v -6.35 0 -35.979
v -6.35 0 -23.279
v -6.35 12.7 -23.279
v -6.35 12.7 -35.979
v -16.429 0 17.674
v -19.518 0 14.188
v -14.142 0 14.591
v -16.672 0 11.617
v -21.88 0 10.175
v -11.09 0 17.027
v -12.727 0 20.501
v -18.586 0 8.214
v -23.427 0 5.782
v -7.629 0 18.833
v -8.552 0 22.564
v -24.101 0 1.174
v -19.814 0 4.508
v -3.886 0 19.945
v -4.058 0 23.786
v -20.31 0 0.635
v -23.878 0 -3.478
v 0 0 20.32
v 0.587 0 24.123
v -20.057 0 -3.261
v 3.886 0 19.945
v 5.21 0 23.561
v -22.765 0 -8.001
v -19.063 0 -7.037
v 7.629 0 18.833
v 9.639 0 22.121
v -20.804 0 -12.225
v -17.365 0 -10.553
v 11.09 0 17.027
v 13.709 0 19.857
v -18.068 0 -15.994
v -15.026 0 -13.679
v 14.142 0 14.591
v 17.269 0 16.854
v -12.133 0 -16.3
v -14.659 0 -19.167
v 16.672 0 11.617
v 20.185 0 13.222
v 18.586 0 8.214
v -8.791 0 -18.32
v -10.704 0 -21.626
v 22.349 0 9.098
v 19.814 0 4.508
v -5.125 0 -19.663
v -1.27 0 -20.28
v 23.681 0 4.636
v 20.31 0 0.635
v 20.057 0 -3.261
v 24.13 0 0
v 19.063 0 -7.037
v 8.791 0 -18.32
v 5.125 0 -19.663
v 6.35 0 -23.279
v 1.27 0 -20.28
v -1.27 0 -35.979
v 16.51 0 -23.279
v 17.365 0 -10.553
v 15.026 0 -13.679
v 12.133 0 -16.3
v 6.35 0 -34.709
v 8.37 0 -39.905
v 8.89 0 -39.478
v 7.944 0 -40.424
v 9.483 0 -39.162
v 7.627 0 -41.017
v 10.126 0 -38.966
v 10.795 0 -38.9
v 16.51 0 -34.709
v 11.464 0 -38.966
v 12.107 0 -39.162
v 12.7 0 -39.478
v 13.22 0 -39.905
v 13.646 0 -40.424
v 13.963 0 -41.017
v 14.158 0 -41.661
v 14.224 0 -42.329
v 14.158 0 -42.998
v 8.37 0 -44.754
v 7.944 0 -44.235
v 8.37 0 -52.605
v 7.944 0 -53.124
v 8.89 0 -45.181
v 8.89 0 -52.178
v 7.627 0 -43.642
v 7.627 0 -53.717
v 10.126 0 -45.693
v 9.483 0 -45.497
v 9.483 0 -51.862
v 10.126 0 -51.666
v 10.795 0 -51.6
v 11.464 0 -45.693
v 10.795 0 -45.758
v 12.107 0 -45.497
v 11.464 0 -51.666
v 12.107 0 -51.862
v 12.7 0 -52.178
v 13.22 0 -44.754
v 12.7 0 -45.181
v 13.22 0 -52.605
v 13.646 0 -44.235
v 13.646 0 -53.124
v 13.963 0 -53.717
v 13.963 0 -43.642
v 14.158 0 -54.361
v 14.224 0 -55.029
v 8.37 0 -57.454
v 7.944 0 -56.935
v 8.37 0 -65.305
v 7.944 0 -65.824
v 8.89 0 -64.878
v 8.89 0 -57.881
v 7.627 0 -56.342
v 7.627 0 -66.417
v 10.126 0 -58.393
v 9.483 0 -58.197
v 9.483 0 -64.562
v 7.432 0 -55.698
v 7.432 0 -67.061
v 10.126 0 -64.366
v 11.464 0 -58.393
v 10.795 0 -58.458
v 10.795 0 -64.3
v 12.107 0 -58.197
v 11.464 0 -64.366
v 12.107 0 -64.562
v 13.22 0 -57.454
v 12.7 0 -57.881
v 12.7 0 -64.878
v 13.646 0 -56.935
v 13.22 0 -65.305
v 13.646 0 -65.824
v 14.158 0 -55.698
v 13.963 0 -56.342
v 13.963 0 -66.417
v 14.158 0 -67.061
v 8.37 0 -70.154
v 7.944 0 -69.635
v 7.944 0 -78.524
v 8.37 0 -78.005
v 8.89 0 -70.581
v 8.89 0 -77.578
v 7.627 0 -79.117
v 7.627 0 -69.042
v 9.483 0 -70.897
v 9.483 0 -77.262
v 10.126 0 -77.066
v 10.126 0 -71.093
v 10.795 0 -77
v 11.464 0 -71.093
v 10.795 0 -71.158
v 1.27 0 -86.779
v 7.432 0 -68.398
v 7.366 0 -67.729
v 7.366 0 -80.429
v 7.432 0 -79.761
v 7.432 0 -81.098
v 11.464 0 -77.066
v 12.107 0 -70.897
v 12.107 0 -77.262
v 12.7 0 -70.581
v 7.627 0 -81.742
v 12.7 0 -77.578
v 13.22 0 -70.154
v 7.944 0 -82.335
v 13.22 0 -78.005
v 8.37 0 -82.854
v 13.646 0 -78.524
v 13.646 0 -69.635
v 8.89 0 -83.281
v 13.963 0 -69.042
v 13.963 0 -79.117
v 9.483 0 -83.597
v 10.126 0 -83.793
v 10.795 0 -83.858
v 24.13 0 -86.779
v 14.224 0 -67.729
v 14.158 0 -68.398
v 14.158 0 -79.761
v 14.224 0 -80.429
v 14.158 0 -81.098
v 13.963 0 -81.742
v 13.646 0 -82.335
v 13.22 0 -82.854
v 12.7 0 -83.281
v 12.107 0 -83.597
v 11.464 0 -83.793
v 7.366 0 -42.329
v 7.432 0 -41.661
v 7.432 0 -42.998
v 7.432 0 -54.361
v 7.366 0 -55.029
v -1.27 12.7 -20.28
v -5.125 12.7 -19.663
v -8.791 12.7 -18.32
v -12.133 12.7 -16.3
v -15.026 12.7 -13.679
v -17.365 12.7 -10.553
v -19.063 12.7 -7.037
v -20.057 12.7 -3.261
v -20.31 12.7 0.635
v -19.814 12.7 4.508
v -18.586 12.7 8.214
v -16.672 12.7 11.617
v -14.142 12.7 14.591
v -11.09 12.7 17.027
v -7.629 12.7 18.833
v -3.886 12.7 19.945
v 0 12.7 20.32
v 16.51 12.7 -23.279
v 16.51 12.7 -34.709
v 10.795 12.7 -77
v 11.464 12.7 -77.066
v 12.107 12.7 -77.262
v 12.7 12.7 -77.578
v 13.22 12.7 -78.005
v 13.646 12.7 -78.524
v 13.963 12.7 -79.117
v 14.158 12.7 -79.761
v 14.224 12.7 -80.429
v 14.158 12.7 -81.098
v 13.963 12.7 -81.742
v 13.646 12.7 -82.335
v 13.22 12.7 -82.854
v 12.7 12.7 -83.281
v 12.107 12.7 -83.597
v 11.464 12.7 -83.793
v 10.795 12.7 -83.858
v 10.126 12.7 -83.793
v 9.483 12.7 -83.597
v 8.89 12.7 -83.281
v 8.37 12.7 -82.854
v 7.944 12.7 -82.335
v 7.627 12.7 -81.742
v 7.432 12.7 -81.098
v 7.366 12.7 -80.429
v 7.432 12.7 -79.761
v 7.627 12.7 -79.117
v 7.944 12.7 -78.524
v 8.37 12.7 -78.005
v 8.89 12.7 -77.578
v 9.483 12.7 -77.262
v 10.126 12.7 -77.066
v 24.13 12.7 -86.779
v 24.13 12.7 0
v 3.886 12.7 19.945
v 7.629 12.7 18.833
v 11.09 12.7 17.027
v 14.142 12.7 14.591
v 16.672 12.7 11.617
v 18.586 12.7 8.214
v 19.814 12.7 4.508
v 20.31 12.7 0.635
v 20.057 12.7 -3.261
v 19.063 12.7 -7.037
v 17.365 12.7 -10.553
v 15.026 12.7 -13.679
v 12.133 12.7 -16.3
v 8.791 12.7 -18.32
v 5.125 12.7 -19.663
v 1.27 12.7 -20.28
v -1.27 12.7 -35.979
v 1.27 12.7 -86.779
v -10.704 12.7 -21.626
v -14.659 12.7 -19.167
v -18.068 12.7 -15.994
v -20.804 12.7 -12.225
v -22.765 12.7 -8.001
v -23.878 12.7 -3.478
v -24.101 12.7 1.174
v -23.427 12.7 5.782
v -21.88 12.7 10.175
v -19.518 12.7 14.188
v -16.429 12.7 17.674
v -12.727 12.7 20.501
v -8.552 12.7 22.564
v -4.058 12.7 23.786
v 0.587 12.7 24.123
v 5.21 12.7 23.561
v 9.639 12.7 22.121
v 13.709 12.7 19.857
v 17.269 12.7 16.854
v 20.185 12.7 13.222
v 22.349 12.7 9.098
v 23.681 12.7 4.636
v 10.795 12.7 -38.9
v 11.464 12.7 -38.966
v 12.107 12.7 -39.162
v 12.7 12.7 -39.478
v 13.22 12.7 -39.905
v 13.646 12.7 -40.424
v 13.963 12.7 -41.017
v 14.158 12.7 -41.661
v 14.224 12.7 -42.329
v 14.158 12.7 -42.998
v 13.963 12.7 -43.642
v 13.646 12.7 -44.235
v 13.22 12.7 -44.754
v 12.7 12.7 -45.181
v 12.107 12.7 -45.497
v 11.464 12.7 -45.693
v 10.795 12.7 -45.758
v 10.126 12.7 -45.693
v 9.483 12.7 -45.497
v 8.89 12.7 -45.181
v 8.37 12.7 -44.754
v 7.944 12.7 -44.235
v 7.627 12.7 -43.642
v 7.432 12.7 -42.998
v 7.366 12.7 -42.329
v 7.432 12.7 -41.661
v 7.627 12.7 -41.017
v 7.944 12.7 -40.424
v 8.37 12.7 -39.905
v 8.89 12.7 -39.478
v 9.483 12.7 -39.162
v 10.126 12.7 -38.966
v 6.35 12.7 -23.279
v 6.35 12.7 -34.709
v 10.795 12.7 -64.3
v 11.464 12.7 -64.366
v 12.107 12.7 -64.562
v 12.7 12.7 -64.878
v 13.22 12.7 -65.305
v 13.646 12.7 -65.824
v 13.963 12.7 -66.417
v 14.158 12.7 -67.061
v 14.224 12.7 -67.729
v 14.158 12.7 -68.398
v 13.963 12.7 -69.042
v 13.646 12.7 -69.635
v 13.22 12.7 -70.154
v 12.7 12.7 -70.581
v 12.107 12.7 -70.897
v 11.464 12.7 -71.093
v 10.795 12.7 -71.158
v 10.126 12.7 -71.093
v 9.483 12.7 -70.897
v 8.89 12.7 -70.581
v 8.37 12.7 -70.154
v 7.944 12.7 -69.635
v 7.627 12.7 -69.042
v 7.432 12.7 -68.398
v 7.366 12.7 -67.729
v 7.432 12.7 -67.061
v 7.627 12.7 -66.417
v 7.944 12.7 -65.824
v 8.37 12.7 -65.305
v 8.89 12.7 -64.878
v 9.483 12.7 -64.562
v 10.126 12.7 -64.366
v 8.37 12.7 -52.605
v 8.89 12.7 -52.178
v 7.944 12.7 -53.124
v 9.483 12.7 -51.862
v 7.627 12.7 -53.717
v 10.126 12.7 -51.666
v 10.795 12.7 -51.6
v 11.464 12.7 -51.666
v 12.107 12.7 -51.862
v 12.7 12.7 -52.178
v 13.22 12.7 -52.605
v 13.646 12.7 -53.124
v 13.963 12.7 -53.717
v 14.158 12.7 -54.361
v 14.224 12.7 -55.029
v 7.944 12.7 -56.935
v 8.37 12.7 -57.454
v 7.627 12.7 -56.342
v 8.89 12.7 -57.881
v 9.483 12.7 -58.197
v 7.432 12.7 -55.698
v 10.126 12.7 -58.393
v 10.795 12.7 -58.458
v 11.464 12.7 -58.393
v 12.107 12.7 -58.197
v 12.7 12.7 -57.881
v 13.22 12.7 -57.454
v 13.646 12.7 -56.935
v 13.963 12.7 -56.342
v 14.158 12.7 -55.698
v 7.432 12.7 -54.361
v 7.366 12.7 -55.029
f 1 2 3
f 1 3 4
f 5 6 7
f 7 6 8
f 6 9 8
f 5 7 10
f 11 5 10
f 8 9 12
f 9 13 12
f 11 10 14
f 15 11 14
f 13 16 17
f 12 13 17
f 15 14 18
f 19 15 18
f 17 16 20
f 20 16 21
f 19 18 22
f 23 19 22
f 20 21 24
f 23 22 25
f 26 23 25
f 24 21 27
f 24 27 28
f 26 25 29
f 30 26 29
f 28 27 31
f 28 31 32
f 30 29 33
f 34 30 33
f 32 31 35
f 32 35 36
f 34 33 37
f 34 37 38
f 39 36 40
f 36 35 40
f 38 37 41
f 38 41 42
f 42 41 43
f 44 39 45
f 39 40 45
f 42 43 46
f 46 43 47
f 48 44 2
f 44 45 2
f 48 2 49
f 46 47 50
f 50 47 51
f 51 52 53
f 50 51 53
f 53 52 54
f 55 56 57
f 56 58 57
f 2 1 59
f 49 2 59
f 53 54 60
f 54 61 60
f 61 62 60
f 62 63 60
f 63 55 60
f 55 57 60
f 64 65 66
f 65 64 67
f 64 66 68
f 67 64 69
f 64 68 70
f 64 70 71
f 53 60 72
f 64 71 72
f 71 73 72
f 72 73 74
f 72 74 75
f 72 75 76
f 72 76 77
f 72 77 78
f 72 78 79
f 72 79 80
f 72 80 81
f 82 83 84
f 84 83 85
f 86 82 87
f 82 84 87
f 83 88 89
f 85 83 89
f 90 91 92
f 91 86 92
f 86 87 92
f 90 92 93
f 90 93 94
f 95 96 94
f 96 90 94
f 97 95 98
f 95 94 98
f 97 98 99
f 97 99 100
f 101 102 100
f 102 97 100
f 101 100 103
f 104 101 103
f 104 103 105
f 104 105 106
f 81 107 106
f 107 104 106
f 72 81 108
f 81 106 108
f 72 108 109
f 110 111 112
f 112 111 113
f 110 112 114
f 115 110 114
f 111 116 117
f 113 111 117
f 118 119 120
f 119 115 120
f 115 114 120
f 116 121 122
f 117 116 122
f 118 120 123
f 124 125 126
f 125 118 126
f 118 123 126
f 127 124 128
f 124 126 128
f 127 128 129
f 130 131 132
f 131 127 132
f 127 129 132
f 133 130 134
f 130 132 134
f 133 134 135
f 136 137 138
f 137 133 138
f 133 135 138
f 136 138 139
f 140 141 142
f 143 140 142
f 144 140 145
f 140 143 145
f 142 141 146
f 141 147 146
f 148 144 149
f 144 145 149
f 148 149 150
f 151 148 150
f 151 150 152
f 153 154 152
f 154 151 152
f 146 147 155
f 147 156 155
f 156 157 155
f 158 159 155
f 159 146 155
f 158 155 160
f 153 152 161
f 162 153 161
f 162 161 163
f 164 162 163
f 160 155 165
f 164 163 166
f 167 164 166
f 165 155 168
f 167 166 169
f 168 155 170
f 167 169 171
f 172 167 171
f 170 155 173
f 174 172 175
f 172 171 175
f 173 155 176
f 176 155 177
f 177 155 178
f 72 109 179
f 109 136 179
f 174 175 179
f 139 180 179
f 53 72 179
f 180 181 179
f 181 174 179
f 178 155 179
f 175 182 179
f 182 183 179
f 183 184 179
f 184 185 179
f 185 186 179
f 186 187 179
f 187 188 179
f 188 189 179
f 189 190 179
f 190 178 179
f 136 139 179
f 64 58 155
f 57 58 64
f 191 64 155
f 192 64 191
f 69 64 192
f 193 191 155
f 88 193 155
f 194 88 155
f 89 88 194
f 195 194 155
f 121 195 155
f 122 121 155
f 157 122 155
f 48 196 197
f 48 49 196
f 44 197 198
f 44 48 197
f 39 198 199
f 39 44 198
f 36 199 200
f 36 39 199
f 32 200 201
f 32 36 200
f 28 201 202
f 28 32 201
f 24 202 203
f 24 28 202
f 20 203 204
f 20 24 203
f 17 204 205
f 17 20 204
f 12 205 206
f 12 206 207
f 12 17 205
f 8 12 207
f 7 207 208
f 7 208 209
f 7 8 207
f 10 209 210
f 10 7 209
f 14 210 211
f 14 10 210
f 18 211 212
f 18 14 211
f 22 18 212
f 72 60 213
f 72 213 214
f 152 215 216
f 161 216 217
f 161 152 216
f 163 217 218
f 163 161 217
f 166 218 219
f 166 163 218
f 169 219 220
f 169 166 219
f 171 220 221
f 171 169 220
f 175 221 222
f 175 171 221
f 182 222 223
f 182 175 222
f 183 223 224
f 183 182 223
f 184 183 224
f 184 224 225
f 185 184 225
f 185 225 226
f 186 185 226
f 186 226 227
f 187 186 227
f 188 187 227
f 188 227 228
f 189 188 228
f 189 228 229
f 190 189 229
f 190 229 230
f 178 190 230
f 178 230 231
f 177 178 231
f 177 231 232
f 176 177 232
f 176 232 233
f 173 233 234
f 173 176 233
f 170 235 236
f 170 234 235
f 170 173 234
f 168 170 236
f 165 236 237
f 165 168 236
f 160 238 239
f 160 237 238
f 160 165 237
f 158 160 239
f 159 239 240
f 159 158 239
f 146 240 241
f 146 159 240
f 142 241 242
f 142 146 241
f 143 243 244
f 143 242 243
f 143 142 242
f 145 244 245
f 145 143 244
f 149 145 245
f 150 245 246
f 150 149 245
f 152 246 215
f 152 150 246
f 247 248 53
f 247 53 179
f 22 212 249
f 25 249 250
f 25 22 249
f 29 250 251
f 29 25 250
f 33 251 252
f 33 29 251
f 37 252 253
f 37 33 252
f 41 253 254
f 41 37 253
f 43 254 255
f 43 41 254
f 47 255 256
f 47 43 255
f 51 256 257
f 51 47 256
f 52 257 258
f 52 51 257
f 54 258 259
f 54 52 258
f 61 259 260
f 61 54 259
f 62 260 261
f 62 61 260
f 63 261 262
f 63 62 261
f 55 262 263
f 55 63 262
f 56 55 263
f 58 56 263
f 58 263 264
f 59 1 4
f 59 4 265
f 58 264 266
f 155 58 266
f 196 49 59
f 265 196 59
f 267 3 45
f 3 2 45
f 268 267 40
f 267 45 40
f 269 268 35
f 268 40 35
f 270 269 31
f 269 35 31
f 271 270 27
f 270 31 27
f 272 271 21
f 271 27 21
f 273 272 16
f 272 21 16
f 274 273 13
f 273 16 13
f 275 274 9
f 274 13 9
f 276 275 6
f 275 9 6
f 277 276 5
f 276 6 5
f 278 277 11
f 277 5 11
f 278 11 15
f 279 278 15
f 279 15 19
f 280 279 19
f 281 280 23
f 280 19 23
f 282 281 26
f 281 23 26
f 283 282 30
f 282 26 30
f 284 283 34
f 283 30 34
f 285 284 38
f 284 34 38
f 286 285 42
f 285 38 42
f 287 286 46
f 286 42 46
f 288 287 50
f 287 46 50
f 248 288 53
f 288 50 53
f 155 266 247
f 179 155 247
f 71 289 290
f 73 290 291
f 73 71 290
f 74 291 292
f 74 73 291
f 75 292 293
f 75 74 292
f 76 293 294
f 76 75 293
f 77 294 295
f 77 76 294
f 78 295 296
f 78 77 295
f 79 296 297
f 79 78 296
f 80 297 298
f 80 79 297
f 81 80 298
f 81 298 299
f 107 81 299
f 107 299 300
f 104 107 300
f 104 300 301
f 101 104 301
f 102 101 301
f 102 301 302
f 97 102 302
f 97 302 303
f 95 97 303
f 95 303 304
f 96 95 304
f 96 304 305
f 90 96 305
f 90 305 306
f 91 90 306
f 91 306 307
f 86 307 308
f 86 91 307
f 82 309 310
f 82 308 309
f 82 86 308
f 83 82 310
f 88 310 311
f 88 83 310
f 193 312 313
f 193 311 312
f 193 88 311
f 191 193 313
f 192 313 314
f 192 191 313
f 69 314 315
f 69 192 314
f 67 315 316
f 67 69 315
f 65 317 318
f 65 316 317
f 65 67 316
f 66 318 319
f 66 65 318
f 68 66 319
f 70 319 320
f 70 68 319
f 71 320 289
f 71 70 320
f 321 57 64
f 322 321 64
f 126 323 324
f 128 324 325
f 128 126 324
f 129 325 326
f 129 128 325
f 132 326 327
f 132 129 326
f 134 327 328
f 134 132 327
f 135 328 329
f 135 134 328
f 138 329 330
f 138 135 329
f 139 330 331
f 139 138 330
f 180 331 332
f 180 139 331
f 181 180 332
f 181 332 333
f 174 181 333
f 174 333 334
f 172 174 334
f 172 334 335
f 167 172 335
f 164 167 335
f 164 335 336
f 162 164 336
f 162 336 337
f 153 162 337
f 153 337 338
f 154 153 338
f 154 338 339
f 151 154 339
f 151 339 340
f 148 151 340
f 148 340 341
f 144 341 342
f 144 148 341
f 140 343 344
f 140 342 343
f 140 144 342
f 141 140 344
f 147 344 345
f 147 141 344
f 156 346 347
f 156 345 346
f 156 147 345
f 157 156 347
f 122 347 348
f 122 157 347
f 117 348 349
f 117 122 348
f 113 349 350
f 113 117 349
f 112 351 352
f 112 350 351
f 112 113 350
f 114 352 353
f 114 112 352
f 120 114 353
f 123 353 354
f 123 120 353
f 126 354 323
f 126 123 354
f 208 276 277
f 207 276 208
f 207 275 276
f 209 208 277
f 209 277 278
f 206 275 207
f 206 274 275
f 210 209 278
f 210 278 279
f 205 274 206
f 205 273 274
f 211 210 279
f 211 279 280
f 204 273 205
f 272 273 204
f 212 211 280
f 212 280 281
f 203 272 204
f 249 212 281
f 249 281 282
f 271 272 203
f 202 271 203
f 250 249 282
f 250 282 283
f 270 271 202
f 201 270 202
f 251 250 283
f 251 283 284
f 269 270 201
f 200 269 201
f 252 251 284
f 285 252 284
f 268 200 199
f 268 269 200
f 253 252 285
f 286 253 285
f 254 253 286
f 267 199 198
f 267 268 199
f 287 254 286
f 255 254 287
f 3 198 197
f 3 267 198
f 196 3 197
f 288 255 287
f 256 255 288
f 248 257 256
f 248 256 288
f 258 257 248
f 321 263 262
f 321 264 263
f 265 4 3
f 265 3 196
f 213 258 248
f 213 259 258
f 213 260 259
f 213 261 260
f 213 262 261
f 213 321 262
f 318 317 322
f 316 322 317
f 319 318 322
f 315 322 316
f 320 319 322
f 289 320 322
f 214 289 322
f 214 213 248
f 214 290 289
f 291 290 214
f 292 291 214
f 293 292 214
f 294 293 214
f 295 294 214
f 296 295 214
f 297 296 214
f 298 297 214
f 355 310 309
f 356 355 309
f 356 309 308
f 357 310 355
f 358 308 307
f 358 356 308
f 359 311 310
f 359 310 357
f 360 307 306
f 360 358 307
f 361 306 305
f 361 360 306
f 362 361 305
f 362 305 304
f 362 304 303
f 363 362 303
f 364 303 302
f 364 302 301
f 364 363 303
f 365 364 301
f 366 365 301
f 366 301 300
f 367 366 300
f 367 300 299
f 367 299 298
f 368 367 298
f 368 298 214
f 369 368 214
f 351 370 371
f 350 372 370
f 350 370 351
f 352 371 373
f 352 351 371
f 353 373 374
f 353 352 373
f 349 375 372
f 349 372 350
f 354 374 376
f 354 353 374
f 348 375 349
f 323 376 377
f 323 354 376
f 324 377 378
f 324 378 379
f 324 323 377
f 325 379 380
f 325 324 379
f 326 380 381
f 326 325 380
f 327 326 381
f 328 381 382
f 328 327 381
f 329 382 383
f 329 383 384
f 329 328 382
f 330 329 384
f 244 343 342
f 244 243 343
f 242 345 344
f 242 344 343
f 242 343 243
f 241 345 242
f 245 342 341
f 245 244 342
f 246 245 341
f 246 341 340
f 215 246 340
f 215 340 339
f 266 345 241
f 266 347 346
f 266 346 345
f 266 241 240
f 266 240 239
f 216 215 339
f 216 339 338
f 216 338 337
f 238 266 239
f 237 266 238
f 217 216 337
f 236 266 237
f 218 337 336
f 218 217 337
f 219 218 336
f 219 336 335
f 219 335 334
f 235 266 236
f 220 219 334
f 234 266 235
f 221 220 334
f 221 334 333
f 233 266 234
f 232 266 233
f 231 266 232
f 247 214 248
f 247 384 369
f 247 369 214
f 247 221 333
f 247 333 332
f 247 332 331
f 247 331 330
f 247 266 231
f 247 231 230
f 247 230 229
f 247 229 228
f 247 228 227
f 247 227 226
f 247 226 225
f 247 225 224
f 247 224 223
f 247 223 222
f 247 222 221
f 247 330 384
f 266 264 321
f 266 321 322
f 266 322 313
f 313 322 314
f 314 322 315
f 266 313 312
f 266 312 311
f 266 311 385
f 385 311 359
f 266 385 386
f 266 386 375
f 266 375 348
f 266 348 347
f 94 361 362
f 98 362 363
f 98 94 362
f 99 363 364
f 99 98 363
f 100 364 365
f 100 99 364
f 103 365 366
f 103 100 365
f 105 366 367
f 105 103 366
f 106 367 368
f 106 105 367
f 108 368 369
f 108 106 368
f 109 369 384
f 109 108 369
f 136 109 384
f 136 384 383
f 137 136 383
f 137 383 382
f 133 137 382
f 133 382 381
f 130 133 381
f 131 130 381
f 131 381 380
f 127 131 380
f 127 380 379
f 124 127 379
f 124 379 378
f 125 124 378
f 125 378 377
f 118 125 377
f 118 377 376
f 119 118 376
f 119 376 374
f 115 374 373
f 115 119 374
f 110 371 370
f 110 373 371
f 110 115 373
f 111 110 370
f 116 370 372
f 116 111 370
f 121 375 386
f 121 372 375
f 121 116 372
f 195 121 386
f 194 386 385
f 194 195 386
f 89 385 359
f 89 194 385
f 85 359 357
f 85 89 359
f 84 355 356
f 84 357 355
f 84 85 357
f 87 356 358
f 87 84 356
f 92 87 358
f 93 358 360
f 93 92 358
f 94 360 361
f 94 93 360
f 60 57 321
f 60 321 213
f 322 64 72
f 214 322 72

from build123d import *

# Parameters (mm, degrees)
SKETCH1_R           = 24.13
SKETCH1_R_2         = 20.32
BOSS_EXTRUDE1_DEPTH = 12.7
SKETCH2_W           = 12.7
SKETCH2_H           = 12.7
BOSS_EXTRUDE2_DEPTH = 12.7
SKETCH4_W           = 2.54
SKETCH4_H           = 58.988343485
CUT_EXTRUDE2_DEPTH  = 46.144990941
BOSS_EXTRUDE3_REACH = 68.615
BOSS_EXTRUDE3_START = 17.78
SKETCH5_W           = 35.97948453
SKETCH5_H           = 12.7
SKETCH6_W           = 22.86
SKETCH6_H           = 50.8
BOSS_EXTRUDE4_DEPTH = 12.7
SKETCH7_R           = 3.429
SKETCH7_W           = 10.16
SKETCH7_H           = 11.43
CUT_EXTRUDE3_DEPTH  = 91.9627717


with BuildPart() as part:
    # Sketch1 → Boss-Extrude1 (new body)
    with BuildSketch(Plane(origin=(0, 0, 0), x_dir=(1, 0, 0), z_dir=(0, 1, 0))):
        with Locations(Location((0, 0, 0), (0, 0, 270))):
            Circle(SKETCH1_R)
        with Locations(Location((0, 0, 0), (0, 0, 270))):
            Circle(SKETCH1_R_2, mode=Mode.SUBTRACT)
    extrude(amount=BOSS_EXTRUDE1_DEPTH)

    # Sketch2 → Boss-Extrude2 (add)
    with BuildSketch(Plane(origin=(0, 0, 0), x_dir=(1, 0, 0), z_dir=(0, 1, 0))):
        with Locations((0, 29.62948453)):
            Rectangle(SKETCH2_W, SKETCH2_H)
    extrude(amount=BOSS_EXTRUDE2_DEPTH)

    # Sketch4 → Cut-Extrude2 (cut, through all)
    with BuildSketch(Plane(origin=(0, 0, 0), x_dir=(1, 0, 0), z_dir=(0, 1, 0))):
        with Locations((0, 30.925816426)):
            Rectangle(SKETCH4_W, SKETCH4_H)
    extrude(amount=CUT_EXTRUDE2_DEPTH, mode=Mode.SUBTRACT)

    # Sketch5 → Boss-Extrude3 (add, up to next)
    with BuildSketch(Plane(origin=(6.35, 0, 0), x_dir=(0, 0, -1), z_dir=(1, 0, 0)).offset(BOSS_EXTRUDE3_START), mode=Mode.PRIVATE) as boss_extrude3_sk1:
        with Locations((17.989742265, 6.35)):
            Rectangle(SKETCH5_W, SKETCH5_H)
    boss_extrude3_tool1 = extrude(boss_extrude3_sk1.sketch, amount=-BOSS_EXTRUDE3_REACH, mode=Mode.PRIVATE) - part.part
    add(boss_extrude3_tool1.solids().sort_by_distance((24.13, 6.35, -17.989742))[0])

    # Sketch6 → Boss-Extrude4 (add)
    with BuildSketch(Plane(origin=(0, 12.7, 0), x_dir=(1, 0, 0), z_dir=(0, 1, 0))):
        with Locations((12.7, 61.37948453)):
            Rectangle(SKETCH6_W, SKETCH6_H)
    extrude(amount=-BOSS_EXTRUDE4_DEPTH)

    # Sketch7 → Cut-Extrude3 (cut, through all)
    with BuildSketch(Plane(origin=(0, 0, 0), x_dir=(1, 0, 0), z_dir=(0, 1, 0))):
        with Locations(Location((10.795, 80.42948453, 0), (0, 0, 270))):
            Circle(SKETCH7_R)
        with Locations((36.195, 80.42948453)):
            Circle(SKETCH7_R)
        with Locations((36.195, 67.72948453)):
            Circle(SKETCH7_R)
        with Locations(Location((10.795, 67.72948453, 0), (0, 0, 270))):
            Circle(SKETCH7_R)
        with Locations(Location((10.795, 55.02948453, 0), (0, 0, 270))):
            Circle(SKETCH7_R)
        with Locations((36.195, 55.02948453)):
            Circle(SKETCH7_R)
        with Locations(Location((10.795, 42.32948453, 0), (0, 0, 270))):
            Circle(SKETCH7_R)
        with Locations((36.195, 42.32948453)):
            Circle(SKETCH7_R)
        with Locations((11.43, 28.99448453)):
            Rectangle(SKETCH7_W, SKETCH7_H)
    extrude(amount=CUT_EXTRUDE3_DEPTH, mode=Mode.SUBTRACT)


solid = part.part
